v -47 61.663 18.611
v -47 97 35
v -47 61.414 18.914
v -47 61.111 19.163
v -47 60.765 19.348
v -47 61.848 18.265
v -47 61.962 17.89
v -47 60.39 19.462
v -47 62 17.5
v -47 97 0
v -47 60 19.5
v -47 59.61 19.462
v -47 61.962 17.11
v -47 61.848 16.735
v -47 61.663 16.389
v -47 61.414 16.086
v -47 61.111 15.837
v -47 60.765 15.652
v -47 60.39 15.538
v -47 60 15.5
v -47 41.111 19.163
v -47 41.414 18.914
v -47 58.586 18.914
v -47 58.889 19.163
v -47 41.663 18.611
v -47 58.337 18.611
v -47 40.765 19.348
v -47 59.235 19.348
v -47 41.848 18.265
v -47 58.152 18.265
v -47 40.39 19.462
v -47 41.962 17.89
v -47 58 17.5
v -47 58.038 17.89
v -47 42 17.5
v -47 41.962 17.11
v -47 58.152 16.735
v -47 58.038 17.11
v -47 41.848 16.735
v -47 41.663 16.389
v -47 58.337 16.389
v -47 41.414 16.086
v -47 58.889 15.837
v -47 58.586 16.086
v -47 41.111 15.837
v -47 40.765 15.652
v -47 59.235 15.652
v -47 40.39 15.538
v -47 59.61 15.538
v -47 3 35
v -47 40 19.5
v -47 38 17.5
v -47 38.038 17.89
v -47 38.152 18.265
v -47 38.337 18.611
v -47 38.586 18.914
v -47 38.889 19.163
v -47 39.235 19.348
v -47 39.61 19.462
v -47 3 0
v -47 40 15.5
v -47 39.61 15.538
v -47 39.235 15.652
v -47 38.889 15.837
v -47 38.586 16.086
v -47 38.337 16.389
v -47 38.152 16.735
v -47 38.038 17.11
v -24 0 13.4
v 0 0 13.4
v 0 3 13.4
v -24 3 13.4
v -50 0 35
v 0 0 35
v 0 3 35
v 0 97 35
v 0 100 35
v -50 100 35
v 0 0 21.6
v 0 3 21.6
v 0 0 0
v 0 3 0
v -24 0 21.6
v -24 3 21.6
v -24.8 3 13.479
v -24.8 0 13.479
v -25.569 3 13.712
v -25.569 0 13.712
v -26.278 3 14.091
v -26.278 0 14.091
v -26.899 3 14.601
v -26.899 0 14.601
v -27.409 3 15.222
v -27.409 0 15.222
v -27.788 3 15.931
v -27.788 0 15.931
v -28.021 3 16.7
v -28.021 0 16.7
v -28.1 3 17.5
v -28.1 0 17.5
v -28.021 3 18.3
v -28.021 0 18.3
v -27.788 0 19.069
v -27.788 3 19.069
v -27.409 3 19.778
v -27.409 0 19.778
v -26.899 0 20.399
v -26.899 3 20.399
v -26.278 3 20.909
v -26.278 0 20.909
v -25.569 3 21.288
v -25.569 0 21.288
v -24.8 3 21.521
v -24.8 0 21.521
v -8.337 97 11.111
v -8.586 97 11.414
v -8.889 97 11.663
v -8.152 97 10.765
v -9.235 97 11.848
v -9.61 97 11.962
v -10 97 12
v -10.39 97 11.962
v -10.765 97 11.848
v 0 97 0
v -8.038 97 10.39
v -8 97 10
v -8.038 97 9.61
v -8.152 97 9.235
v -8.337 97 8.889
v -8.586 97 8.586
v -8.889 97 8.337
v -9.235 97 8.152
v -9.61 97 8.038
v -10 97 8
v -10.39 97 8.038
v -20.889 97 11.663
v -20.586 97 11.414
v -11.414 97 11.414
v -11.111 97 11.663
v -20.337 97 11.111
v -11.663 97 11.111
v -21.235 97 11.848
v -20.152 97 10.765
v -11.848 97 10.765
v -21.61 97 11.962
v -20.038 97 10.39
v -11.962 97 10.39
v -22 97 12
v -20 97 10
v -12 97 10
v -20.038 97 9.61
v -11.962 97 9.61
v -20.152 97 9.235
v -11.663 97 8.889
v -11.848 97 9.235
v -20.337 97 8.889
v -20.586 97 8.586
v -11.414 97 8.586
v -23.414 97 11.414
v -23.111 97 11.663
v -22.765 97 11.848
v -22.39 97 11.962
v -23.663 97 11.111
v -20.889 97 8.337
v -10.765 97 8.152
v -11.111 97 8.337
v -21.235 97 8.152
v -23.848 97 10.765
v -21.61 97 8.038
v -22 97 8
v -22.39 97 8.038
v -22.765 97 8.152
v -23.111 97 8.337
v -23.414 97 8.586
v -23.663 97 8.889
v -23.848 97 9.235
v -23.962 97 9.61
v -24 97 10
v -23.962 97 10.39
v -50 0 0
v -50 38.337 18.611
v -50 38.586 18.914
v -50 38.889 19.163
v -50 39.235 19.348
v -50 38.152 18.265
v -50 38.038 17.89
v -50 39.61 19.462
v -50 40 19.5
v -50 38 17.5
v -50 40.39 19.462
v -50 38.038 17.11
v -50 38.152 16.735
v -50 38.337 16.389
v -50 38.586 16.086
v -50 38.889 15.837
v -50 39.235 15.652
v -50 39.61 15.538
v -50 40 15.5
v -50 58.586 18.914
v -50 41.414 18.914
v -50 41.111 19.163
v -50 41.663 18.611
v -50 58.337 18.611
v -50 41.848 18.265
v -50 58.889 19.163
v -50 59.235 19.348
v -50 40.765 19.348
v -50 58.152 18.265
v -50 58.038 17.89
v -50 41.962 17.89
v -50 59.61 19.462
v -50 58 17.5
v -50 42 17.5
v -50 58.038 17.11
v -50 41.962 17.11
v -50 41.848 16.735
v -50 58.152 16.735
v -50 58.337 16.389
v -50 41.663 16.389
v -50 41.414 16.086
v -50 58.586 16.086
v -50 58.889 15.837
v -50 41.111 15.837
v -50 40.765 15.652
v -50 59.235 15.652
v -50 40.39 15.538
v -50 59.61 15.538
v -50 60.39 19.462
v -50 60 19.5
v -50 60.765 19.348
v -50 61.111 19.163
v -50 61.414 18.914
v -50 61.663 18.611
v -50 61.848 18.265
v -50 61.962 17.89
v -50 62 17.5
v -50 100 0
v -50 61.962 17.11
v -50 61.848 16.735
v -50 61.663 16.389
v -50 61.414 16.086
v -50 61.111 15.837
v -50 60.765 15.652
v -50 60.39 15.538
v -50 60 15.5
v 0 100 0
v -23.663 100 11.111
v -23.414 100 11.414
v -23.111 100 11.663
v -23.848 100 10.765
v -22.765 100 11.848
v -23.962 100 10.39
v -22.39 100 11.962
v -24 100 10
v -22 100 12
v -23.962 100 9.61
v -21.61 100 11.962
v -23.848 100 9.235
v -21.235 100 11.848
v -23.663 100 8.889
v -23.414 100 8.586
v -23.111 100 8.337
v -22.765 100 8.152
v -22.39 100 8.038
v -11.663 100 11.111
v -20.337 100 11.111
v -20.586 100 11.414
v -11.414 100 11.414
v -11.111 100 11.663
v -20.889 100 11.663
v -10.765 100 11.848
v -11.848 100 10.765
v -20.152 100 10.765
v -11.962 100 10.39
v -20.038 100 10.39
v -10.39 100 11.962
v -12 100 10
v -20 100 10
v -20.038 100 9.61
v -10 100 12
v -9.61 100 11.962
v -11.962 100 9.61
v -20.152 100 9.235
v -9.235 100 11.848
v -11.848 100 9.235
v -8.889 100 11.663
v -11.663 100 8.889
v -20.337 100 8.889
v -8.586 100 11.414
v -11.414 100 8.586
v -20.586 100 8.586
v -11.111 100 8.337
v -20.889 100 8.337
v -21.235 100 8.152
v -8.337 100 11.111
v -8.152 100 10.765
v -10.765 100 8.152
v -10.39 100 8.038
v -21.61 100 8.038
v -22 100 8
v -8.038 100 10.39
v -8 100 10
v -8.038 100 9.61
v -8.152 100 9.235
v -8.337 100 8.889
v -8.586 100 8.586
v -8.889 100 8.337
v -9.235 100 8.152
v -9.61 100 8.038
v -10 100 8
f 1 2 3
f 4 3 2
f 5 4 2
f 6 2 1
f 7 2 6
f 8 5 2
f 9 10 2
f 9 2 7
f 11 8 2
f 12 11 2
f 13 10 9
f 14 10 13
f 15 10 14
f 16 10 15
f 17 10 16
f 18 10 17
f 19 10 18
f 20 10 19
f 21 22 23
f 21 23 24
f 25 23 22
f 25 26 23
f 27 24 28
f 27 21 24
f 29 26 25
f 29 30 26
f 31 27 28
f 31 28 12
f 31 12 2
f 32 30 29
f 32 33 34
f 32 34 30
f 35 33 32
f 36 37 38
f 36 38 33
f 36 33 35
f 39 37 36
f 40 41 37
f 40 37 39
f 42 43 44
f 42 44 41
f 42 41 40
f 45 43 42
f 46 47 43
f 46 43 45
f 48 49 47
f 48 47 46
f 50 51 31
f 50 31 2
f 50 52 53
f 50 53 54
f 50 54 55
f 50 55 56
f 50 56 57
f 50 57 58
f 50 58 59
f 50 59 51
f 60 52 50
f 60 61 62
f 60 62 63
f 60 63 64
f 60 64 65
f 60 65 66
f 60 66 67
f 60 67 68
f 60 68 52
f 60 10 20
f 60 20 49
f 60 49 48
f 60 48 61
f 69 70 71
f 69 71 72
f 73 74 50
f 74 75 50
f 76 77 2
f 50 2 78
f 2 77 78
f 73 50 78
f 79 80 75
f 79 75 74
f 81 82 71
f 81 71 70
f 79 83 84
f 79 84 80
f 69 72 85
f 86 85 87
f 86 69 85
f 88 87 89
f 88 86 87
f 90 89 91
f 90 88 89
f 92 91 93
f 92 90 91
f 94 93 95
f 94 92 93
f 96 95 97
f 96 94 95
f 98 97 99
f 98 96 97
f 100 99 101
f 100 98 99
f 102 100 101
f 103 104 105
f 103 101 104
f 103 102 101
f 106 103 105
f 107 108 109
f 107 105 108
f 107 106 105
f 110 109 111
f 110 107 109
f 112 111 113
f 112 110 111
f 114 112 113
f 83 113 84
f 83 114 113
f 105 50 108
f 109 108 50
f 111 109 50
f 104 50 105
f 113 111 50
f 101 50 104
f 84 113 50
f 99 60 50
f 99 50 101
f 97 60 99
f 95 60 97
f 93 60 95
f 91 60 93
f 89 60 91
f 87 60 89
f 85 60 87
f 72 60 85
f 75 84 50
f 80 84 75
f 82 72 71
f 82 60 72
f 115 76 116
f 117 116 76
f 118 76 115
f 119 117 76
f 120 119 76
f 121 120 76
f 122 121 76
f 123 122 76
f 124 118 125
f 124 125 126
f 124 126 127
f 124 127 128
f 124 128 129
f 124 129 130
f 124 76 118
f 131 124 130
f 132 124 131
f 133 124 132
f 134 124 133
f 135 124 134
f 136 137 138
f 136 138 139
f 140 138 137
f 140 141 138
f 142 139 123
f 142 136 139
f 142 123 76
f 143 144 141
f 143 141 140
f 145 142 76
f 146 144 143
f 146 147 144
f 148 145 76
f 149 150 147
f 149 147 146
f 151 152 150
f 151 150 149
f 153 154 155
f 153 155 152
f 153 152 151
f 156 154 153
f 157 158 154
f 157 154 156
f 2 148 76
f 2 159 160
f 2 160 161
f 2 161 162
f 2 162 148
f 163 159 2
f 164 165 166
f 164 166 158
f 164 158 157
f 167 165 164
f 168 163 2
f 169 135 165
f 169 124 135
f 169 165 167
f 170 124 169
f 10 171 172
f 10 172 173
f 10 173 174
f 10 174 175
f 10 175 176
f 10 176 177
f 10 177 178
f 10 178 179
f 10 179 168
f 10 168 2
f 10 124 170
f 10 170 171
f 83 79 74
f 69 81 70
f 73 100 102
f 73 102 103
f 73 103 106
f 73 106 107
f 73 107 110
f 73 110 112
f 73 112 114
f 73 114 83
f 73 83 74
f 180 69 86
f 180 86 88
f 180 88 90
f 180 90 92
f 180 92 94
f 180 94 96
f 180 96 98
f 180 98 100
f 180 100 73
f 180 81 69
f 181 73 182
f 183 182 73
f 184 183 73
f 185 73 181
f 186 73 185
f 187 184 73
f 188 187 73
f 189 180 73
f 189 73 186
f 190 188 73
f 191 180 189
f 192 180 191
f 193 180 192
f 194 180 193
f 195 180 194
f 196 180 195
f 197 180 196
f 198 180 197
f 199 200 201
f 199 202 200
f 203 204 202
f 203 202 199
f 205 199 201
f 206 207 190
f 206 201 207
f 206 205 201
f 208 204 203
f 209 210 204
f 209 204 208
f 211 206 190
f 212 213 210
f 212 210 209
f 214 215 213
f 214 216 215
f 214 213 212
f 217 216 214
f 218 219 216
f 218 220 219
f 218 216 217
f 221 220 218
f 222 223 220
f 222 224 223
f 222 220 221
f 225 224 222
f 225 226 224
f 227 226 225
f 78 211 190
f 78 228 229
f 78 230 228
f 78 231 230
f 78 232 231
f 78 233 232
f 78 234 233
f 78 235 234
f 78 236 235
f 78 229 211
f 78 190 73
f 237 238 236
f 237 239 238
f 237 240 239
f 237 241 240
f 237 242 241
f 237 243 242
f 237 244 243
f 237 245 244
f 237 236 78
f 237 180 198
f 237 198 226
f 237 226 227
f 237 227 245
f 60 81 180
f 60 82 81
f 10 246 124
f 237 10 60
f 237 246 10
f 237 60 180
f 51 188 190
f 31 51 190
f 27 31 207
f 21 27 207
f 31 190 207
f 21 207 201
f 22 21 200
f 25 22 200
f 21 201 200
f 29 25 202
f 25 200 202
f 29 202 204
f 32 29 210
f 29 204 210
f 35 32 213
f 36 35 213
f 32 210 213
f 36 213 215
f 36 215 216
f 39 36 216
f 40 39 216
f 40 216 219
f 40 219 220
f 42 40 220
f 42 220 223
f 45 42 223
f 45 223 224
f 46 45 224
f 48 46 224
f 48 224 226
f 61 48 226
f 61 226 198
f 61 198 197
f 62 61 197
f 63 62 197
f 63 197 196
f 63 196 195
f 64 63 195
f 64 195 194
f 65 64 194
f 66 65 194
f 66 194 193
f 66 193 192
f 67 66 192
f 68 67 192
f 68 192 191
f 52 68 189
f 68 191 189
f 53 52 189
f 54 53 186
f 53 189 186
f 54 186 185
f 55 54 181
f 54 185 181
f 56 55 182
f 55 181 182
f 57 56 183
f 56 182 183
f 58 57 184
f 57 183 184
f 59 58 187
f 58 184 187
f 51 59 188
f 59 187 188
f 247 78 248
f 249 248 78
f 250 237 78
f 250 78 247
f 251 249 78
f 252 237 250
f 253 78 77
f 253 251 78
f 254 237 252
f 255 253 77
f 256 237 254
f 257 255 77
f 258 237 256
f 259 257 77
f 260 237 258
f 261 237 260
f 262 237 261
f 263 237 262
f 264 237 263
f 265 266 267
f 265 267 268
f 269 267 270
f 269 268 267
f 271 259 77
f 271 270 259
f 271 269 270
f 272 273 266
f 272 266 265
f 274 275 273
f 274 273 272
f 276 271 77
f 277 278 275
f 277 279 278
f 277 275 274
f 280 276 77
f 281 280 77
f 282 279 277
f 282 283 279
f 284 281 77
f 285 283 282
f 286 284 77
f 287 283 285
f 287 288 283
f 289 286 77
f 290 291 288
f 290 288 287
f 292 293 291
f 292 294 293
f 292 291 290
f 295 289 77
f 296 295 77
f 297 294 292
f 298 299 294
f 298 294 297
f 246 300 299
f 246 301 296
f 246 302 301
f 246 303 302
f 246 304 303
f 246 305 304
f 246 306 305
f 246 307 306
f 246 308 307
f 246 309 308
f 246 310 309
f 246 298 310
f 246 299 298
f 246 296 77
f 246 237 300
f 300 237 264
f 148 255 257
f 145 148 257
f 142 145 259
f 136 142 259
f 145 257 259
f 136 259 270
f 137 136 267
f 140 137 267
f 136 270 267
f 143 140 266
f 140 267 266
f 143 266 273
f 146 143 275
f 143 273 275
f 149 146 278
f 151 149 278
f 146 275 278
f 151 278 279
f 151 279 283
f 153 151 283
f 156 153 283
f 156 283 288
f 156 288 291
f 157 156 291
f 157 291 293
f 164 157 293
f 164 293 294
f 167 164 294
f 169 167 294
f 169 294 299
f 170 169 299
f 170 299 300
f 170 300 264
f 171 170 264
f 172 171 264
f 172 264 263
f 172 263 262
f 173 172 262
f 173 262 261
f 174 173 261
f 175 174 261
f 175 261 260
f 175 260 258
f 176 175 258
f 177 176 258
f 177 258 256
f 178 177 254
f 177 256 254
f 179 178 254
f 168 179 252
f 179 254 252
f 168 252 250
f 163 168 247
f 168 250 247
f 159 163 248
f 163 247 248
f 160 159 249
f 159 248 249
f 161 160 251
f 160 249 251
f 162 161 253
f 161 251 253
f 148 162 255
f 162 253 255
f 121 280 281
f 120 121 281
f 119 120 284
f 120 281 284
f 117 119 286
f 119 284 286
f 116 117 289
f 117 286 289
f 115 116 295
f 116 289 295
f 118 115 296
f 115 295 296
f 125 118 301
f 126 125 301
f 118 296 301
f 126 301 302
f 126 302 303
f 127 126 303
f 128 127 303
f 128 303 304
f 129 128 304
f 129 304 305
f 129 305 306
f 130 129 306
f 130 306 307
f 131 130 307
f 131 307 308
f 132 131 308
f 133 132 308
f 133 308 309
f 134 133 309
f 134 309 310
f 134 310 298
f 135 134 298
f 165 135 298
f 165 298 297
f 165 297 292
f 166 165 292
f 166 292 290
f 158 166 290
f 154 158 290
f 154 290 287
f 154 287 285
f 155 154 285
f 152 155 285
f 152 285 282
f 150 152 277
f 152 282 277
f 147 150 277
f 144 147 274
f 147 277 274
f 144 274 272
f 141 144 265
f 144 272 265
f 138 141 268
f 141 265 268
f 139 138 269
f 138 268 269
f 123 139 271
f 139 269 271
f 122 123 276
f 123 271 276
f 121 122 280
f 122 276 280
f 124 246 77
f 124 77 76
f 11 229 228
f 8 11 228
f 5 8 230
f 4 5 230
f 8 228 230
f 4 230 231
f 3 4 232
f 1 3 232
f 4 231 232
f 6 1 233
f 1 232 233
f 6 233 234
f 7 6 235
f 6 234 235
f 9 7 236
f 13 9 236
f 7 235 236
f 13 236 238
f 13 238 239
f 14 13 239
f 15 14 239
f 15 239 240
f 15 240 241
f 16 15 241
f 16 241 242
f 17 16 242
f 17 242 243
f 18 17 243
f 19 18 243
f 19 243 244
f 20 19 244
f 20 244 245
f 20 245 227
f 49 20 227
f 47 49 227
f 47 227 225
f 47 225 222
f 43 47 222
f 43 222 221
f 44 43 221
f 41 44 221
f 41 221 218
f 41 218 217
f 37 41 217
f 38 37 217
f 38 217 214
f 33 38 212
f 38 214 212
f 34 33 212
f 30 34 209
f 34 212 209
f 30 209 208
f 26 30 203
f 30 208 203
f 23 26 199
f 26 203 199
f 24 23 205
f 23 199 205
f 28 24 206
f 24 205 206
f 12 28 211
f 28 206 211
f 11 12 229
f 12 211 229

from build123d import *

# Parameters (mm, degrees)
BOSS_EXTRUDE1_DEPTH = 35
CUT_EXTRUDE1_REACH  = 119.154
CUT_EXTRUDE2_REACH  = 119.154
SKETCH3_R           = 2
CUT_EXTRUDE3_REACH  = 119.154
SKETCH4_R           = 2


with BuildPart() as part:
    # Sketch1 → Boss-Extrude1 (new body)
    with BuildSketch(Plane.XY):
        Polygon((0, 0), (-50, 0), (-50, 100), (0, 100), (0, 97), (-47, 97), (-47, 3), (0, 3), align=None)
    extrude(amount=BOSS_EXTRUDE1_DEPTH)

    # Sketch2 → Cut-Extrude1 (cut, up to next)
    with BuildSketch(Plane.XZ, mode=Mode.PRIVATE) as cut_extrude1_sk1:
        with BuildLine():
            Line((0, 13.4), (-24, 13.4))
            ThreePointArc((-24, 13.4), (-28.1, 17.5), (-24, 21.6))
            Line((-24, 21.6), (0, 21.6))
            Line((0, 21.6), (0, 13.4))
        make_face()
    cut_extrude1_tool1 = extrude(cut_extrude1_sk1.sketch, amount=-CUT_EXTRUDE1_REACH, mode=Mode.PRIVATE) & part.part
    add(cut_extrude1_tool1.solids().sort_by_distance((-13.625448, 0, 17.5))[0], mode=Mode.SUBTRACT)

    # Sketch3 → Cut-Extrude2 (cut, up to next)
    with BuildSketch(Plane(origin=(0, 100, 0), x_dir=(1, 0, 0), z_dir=(0, 1, 0)), mode=Mode.PRIVATE) as cut_extrude2_sk1:
        with Locations(Location((-22, -10, 0), (0, 0, 270))):
            Circle(SKETCH3_R)
    cut_extrude2_tool1 = extrude(cut_extrude2_sk1.sketch, amount=-CUT_EXTRUDE2_REACH, mode=Mode.PRIVATE) & part.part
    # Sketch3 → Cut-Extrude2 (cut, up to next)
    with BuildSketch(Plane(origin=(0, 100, 0), x_dir=(1, 0, 0), z_dir=(0, 1, 0)), mode=Mode.PRIVATE) as cut_extrude2_sk2:
        with Locations(Location((-10, -10, 0), (0, 0, 270))):
            Circle(SKETCH3_R)
    cut_extrude2_tool2 = extrude(cut_extrude2_sk2.sketch, amount=-CUT_EXTRUDE2_REACH, mode=Mode.PRIVATE) & part.part
    add(cut_extrude2_tool1.solids().sort_by_distance((-22, 100, 10))[0], mode=Mode.SUBTRACT)
    add(cut_extrude2_tool2.solids().sort_by_distance((-10, 100, 10))[0], mode=Mode.SUBTRACT)

    # Sketch4 → Cut-Extrude3 (cut, up to next)
    with BuildSketch(Plane.ZY.offset(50), mode=Mode.PRIVATE) as cut_extrude3_sk1:
        with Locations((17.5, 60)):
            Circle(SKETCH4_R)
    cut_extrude3_tool1 = extrude(cut_extrude3_sk1.sketch, amount=-CUT_EXTRUDE3_REACH, mode=Mode.PRIVATE) & part.part
    # Sketch4 → Cut-Extrude3 (cut, up to next)
    with BuildSketch(Plane.ZY.offset(50), mode=Mode.PRIVATE) as cut_extrude3_sk2:
        with Locations((17.5, 40)):
            Circle(SKETCH4_R)
    cut_extrude3_tool2 = extrude(cut_extrude3_sk2.sketch, amount=-CUT_EXTRUDE3_REACH, mode=Mode.PRIVATE) & part.part
    add(cut_extrude3_tool1.solids().sort_by_distance((-50, 60, 17.5))[0], mode=Mode.SUBTRACT)
    add(cut_extrude3_tool2.solids().sort_by_distance((-50, 40, 17.5))[0], mode=Mode.SUBTRACT)


solid = part.part
